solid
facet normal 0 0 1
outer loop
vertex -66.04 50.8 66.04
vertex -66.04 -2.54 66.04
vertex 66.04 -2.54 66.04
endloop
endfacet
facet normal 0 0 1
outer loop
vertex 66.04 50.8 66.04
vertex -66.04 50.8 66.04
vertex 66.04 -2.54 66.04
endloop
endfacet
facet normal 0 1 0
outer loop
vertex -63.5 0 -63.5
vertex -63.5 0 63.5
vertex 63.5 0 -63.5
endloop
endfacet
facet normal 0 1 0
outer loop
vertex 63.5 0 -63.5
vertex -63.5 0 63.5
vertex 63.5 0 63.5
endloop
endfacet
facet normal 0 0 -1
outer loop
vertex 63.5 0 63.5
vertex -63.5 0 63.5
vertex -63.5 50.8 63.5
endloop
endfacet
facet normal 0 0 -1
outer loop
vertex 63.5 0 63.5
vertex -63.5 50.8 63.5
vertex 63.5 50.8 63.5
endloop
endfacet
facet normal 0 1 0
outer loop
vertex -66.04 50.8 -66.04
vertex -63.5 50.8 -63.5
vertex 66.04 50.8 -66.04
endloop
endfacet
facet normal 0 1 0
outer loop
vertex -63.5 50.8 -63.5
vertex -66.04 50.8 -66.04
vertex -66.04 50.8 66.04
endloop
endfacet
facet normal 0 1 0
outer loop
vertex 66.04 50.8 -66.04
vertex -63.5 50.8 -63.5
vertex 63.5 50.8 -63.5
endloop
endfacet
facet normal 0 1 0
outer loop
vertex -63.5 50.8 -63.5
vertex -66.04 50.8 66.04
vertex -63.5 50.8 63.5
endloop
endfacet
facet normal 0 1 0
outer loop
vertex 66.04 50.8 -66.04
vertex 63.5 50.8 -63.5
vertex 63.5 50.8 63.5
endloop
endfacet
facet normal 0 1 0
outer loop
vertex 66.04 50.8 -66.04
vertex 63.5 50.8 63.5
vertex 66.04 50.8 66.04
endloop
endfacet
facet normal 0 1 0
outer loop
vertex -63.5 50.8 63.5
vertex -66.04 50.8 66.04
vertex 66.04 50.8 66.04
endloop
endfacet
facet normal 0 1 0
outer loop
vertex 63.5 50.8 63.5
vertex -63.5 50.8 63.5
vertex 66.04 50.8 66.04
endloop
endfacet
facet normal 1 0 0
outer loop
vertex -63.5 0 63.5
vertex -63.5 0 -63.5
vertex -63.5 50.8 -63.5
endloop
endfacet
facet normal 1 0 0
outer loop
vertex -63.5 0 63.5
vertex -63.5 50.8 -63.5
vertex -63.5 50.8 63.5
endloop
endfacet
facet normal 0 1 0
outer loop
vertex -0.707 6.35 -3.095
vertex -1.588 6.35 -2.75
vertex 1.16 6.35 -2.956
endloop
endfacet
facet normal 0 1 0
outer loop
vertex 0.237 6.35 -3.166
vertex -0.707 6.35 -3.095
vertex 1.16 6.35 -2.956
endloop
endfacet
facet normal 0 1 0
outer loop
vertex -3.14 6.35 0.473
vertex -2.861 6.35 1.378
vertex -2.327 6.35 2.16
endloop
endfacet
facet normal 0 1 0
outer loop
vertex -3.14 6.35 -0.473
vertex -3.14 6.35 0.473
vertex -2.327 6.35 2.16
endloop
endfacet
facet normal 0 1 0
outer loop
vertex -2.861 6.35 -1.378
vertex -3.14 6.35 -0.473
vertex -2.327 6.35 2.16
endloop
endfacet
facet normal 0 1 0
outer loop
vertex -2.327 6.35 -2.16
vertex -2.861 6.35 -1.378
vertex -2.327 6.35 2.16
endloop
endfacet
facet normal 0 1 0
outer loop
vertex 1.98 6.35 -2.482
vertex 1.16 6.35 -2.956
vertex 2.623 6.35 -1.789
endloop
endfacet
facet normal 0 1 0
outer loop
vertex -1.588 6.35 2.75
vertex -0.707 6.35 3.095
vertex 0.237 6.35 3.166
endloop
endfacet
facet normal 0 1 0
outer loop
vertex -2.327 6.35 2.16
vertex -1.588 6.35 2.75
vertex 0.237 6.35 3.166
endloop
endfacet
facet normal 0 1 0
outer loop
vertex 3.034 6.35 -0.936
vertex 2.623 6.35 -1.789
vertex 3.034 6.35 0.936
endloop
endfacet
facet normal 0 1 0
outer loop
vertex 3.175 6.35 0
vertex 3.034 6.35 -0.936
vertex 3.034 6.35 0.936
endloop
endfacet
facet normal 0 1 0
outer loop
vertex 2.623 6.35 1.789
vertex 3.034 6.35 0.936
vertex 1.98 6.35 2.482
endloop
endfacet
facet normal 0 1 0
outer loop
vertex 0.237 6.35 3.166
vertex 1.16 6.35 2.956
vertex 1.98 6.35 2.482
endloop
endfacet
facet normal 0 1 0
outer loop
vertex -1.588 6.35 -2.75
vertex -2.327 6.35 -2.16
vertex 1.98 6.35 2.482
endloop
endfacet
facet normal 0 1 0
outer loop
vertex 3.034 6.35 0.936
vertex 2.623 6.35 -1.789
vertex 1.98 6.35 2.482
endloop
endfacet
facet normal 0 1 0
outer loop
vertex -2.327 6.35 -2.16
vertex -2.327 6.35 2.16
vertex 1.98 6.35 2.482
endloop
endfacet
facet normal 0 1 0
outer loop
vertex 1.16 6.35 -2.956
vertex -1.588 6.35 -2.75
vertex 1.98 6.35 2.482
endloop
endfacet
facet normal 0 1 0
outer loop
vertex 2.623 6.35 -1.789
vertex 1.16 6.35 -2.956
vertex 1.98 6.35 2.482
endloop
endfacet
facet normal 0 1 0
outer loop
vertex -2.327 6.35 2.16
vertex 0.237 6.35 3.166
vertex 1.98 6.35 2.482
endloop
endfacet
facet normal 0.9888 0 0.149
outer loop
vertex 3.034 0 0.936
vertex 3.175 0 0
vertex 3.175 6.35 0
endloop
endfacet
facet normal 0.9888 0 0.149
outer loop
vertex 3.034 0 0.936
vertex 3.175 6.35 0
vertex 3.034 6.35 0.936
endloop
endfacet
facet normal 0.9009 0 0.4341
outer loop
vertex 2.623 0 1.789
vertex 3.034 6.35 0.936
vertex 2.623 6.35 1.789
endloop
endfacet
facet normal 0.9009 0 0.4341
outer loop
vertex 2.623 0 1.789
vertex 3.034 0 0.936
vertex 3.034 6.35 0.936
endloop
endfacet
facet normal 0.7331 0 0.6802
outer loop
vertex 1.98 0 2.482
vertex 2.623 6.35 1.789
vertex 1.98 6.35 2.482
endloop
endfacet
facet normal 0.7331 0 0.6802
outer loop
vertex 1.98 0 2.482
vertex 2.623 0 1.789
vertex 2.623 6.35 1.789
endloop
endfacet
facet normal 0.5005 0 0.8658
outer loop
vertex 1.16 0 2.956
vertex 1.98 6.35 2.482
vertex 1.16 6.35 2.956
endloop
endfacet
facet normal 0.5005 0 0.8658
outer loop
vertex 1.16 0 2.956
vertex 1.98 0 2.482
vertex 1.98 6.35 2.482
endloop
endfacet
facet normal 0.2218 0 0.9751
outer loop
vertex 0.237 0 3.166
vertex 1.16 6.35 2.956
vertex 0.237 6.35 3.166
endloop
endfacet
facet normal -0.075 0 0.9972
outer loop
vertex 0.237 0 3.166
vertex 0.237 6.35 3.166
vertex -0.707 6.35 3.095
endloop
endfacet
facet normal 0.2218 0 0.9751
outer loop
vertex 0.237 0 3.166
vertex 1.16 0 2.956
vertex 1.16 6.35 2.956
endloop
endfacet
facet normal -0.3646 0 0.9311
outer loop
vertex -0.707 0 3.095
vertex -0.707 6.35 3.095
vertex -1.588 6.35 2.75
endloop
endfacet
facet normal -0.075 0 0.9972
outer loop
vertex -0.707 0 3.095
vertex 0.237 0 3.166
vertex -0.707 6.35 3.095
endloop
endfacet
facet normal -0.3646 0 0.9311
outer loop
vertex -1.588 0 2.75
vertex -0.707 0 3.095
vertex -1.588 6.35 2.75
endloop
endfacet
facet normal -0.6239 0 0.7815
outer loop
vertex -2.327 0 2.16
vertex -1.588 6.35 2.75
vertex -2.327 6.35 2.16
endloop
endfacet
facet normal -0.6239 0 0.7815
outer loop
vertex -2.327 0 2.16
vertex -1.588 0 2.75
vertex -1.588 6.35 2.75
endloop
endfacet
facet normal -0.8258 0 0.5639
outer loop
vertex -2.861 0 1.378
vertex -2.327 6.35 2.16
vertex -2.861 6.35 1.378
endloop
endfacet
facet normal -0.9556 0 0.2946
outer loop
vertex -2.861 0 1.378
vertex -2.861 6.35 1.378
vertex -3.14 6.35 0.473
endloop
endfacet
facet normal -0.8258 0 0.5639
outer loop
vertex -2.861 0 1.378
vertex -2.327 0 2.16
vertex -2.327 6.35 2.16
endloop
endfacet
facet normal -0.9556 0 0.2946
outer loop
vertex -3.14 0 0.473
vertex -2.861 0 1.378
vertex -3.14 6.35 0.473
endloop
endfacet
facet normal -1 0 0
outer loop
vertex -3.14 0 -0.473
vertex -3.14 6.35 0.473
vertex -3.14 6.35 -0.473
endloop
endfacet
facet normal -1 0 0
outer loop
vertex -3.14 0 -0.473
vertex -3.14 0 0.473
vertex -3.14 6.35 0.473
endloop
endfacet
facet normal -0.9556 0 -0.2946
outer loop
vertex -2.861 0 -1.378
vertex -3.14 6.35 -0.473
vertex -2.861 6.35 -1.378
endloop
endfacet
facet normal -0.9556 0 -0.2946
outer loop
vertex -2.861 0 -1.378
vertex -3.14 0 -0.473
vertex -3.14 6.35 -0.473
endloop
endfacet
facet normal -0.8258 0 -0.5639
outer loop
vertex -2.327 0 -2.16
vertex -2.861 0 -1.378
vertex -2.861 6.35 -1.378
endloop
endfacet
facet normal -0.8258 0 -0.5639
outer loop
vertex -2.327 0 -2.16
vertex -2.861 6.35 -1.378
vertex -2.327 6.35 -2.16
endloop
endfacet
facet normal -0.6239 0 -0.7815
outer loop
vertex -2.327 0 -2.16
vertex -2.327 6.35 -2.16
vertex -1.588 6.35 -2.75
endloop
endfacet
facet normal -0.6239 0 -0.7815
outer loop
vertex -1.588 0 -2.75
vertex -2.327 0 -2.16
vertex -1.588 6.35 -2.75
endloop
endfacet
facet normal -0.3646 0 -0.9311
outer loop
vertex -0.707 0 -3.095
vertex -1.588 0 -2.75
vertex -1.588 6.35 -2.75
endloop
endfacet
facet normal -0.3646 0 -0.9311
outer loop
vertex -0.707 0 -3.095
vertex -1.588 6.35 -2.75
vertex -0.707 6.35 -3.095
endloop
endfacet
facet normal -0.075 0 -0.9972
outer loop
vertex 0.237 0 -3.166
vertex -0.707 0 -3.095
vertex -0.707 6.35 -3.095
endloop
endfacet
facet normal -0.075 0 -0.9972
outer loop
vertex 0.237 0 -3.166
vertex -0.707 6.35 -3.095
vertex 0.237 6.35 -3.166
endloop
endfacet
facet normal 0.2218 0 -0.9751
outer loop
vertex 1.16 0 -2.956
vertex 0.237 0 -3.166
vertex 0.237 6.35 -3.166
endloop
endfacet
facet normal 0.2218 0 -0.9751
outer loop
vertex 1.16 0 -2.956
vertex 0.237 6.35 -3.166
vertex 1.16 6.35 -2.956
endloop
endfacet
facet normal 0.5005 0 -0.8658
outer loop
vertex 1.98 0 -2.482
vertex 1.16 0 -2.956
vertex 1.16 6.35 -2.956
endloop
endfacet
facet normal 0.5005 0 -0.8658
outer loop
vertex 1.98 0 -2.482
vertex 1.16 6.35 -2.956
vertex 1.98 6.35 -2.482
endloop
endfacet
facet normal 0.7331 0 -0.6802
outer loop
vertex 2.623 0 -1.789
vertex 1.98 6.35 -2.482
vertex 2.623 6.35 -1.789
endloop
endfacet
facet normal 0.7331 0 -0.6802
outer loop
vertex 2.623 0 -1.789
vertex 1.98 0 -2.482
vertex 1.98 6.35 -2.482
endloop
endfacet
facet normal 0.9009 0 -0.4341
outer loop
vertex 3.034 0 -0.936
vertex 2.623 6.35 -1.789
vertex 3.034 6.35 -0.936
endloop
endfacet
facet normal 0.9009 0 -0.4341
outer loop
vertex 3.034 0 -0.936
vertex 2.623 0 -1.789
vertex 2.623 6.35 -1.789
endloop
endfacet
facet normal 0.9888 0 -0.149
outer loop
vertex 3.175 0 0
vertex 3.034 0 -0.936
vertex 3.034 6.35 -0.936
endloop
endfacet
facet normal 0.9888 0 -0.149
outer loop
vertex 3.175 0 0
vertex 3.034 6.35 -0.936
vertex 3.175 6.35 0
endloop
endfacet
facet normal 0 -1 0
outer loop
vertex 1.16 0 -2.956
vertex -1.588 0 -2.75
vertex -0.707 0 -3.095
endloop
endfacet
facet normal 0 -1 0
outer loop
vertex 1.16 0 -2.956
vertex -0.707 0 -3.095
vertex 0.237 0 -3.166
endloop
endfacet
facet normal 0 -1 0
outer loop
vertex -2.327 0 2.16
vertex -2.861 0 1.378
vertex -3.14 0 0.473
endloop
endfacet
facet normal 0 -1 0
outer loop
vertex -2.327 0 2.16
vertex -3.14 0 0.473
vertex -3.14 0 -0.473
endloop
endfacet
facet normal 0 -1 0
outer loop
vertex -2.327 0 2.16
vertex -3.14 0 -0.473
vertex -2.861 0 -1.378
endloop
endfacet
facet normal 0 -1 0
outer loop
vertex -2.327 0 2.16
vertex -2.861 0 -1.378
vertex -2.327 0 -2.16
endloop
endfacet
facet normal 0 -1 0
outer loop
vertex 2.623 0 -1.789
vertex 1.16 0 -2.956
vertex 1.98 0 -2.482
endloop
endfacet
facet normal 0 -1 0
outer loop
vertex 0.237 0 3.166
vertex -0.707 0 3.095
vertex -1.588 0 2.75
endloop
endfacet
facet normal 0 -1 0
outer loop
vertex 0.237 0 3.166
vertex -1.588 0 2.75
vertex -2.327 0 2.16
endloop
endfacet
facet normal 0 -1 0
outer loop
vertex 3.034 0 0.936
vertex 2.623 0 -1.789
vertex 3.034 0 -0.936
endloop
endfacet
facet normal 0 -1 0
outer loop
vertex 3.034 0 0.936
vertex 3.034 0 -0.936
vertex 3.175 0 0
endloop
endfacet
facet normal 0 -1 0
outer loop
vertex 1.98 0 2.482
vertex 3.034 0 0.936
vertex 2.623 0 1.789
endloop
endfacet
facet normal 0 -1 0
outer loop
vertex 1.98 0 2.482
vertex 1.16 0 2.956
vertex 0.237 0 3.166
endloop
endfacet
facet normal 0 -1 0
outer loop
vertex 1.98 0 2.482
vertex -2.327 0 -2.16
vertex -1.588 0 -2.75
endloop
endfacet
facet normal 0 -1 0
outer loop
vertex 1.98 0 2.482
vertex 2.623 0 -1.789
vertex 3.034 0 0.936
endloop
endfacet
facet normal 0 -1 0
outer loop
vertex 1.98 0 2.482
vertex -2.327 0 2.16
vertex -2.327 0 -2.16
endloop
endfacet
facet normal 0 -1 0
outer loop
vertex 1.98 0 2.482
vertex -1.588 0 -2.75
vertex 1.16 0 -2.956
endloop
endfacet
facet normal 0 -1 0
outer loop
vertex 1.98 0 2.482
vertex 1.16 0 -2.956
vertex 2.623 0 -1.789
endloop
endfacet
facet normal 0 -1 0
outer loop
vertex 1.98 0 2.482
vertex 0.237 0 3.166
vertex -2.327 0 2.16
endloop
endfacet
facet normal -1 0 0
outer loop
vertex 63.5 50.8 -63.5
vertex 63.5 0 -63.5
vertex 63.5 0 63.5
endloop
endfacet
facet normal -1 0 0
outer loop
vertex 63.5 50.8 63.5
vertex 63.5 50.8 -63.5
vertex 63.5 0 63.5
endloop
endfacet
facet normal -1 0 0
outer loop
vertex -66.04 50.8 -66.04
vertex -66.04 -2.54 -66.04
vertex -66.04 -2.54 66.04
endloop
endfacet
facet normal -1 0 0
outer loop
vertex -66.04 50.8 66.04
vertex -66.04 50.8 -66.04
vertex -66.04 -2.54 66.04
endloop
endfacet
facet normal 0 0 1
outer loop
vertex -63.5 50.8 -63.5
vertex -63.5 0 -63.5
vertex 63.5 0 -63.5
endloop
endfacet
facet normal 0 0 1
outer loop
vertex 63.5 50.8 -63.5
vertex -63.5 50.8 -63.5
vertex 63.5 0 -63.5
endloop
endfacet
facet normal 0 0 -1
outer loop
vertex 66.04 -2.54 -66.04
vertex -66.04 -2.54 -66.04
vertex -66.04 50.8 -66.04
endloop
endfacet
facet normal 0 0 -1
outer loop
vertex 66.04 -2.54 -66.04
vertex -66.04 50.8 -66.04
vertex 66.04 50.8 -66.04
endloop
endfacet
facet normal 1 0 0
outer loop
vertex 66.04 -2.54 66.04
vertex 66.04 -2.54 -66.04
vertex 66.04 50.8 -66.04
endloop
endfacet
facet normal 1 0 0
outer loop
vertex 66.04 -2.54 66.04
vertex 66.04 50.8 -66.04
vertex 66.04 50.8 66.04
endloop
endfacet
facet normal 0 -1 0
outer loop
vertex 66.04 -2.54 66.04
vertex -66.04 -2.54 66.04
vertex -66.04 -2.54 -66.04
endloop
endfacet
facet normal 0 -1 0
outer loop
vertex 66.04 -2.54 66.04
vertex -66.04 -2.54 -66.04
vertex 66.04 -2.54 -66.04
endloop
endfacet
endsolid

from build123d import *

# Parameters (mm, degrees)
F0_W     = 127
F0_H     = 127
F1_DEPTH = 50.8
F2_R     = 3.175
F3_DEPTH = 6.35
F4_T     = 2.54


with BuildPart() as f1:
    # F0 (on Front) → F1 (new body)
    with BuildSketch(Plane.XZ):
        Rectangle(F0_W, F0_H)
    extrude(amount=-F1_DEPTH)

    # F4
    f4_openings = [f1.faces().sort_by_distance(p)[0] for p in [
        (0, 50.8, 0),
    ]]
    offset(amount=F4_T, openings=f4_openings, kind=Kind.INTERSECTION)


with BuildPart() as f3:
    # F2 (on face) → F3 (new body)
    with BuildSketch(Plane.XZ):
        Circle(F2_R)
    extrude(amount=-F3_DEPTH)


solid = Compound([f1.part, f3.part])
